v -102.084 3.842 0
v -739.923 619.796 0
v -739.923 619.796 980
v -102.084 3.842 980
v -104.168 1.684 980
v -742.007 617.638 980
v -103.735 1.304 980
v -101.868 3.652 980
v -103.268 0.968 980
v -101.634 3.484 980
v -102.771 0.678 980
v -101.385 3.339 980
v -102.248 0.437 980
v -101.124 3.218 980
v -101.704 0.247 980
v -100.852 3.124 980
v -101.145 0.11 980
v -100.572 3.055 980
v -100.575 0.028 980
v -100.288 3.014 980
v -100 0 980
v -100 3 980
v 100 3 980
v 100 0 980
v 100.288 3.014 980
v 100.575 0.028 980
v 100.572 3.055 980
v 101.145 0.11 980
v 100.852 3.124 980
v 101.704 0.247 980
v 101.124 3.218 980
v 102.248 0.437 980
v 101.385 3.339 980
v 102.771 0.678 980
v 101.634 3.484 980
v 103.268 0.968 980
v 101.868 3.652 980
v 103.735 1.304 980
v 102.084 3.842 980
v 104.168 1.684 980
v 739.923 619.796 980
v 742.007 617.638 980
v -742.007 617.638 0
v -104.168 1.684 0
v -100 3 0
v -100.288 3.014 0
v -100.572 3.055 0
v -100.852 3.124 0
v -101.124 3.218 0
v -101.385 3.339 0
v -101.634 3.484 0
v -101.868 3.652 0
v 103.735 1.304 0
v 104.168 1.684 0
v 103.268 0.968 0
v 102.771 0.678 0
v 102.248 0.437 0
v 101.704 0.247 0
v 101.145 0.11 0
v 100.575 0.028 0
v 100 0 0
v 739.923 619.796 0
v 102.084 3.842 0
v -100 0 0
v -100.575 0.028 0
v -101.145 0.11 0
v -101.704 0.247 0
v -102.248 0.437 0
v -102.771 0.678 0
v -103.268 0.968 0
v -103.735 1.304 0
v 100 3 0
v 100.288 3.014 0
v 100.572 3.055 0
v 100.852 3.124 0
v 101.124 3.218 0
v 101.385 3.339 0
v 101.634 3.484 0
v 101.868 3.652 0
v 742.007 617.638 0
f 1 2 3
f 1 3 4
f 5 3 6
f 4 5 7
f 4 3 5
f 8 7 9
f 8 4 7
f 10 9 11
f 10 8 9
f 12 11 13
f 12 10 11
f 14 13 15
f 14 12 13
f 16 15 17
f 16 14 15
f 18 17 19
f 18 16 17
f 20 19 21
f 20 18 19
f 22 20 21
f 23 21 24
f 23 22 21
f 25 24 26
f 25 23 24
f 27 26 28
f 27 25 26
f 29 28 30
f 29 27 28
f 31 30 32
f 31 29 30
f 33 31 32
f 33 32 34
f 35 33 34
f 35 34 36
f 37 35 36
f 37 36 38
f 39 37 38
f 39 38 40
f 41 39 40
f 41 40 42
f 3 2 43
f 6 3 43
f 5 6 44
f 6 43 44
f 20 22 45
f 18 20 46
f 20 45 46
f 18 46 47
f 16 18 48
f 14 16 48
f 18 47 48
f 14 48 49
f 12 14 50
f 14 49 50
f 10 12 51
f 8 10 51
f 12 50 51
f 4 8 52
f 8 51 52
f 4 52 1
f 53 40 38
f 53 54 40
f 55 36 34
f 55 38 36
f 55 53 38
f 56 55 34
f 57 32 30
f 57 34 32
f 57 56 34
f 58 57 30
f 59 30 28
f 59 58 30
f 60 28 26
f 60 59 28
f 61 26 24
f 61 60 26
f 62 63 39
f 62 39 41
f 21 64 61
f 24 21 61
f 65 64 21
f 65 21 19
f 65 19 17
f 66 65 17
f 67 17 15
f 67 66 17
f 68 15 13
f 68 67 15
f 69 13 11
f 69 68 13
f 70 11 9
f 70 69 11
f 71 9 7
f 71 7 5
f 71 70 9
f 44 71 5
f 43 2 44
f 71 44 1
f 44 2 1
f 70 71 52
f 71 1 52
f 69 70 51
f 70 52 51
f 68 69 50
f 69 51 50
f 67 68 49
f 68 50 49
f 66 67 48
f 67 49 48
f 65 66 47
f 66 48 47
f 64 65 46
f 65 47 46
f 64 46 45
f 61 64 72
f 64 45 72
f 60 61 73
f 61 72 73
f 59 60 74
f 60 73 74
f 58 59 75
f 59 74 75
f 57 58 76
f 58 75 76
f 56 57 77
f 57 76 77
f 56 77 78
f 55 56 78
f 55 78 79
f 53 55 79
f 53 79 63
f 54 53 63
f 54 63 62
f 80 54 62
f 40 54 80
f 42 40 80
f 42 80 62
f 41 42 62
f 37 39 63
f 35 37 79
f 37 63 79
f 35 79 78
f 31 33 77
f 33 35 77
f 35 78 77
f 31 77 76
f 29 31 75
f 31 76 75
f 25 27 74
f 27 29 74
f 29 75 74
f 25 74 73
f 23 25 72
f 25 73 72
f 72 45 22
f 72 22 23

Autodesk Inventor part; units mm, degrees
ref_plane "YZ Plane" through (0, 0, 0) normal (1, 0, 0) x (0, 1, 0)
ref_plane "XZ Plane" through (0, 0, 0) normal (0, 1, 0) x (-1, 0, 0)
ref_plane "XY Plane" through (0, 0, 0) normal (0, 0, 1) x (1, 0, 0)
sketch "Sketch1" plane through (0, 0, 0) normal (0, 0, 1) x (1, 0, 0)
  line L0 (104.168, 1.684) -> (742.0066, 617.6375)
  arc A0 (100, 0) -> (104.168, 1.684) centre (100, 6) ccw
  line L1 (0, 0) -> (100, 0)
  dimension "d25" = 6
  dimension "d48" = 742.0065
  dimension "d49" = 136
  dimension "d50" = 100
  dimension "d51" = 886.7
contour flange "Contour Flange1" sketch "Sketch1" thickness 3 bend radius 3 width 980 along (0, 0, 1) mid plane no both sides no wall seen from (50, 0, 0) lies toward (0, 1, 0) curves L1 A0 L0
bend "Bend1"
corner "Corner1"
mirror "Mirror1" about plane through (0, 0, 0) normal (1, 0, 0)
sketch "Sketch2" plane through (-102.084, 3.842, 980) normal (0.6946584, 0.7193398, 0) x (0.7193398, -0.6946584, 0)
  line L0 (-842.2117, 70.9383) -> (-842.2117, 209.5784) construction
  line L1 (-842.2117, 209.5784) -> (-819.3515, 209.5784) construction
  line L2 (-819.3515, 209.5784) -> (-819.3515, 70.9383) construction
  line L3 (-819.3515, 70.9383) -> (-842.2117, 70.9383) construction
  point P0 (76.1019, 980)
mark "Mark1"
equation "\"d25\" = Thickness + BendRadius"
equation "\"d7\" = Thickness"
equation "\"d8\" = BendReliefWidth"
equation "\"d9\" = BendReliefDepth"
equation "\"d10\" = MinimumRemnant"
equation "\"d11\" = TransitionRadius"
equation "\"d13\" = BendRadius"
equation "\"d15\" = CornerReliefSize"
equation "\"d16\" = GapSize"
equation "\"d17\" = JacobiRadiusSize"
equation "\"BendRadius\" = Thickness"
equation "\"BendReliefWidth\" = Thickness"
equation "\"BendReliefDepth\" = 0.5 * Thickness"
equation "\"CornerReliefSize\" = 4 * Thickness"
equation "\"MinimumRemnant\" = 2 * Thickness"
equation "\"TransitionRadius\" = BendRadius"
equation "\"JacobiRadiusSize\" = BendRadius"
equation "\"GapSize\" = Thickness"
equation "\"d38\" = d40 + d44"
equation "\"d39\" = d40"
equation "\"d44\" = d40"
equation "\"Thickness\" = 3"
equation "\"d40\" = 3"
properties part number "MSC 501 SHEET BELLY MAIN" material "Stainless Steel"
